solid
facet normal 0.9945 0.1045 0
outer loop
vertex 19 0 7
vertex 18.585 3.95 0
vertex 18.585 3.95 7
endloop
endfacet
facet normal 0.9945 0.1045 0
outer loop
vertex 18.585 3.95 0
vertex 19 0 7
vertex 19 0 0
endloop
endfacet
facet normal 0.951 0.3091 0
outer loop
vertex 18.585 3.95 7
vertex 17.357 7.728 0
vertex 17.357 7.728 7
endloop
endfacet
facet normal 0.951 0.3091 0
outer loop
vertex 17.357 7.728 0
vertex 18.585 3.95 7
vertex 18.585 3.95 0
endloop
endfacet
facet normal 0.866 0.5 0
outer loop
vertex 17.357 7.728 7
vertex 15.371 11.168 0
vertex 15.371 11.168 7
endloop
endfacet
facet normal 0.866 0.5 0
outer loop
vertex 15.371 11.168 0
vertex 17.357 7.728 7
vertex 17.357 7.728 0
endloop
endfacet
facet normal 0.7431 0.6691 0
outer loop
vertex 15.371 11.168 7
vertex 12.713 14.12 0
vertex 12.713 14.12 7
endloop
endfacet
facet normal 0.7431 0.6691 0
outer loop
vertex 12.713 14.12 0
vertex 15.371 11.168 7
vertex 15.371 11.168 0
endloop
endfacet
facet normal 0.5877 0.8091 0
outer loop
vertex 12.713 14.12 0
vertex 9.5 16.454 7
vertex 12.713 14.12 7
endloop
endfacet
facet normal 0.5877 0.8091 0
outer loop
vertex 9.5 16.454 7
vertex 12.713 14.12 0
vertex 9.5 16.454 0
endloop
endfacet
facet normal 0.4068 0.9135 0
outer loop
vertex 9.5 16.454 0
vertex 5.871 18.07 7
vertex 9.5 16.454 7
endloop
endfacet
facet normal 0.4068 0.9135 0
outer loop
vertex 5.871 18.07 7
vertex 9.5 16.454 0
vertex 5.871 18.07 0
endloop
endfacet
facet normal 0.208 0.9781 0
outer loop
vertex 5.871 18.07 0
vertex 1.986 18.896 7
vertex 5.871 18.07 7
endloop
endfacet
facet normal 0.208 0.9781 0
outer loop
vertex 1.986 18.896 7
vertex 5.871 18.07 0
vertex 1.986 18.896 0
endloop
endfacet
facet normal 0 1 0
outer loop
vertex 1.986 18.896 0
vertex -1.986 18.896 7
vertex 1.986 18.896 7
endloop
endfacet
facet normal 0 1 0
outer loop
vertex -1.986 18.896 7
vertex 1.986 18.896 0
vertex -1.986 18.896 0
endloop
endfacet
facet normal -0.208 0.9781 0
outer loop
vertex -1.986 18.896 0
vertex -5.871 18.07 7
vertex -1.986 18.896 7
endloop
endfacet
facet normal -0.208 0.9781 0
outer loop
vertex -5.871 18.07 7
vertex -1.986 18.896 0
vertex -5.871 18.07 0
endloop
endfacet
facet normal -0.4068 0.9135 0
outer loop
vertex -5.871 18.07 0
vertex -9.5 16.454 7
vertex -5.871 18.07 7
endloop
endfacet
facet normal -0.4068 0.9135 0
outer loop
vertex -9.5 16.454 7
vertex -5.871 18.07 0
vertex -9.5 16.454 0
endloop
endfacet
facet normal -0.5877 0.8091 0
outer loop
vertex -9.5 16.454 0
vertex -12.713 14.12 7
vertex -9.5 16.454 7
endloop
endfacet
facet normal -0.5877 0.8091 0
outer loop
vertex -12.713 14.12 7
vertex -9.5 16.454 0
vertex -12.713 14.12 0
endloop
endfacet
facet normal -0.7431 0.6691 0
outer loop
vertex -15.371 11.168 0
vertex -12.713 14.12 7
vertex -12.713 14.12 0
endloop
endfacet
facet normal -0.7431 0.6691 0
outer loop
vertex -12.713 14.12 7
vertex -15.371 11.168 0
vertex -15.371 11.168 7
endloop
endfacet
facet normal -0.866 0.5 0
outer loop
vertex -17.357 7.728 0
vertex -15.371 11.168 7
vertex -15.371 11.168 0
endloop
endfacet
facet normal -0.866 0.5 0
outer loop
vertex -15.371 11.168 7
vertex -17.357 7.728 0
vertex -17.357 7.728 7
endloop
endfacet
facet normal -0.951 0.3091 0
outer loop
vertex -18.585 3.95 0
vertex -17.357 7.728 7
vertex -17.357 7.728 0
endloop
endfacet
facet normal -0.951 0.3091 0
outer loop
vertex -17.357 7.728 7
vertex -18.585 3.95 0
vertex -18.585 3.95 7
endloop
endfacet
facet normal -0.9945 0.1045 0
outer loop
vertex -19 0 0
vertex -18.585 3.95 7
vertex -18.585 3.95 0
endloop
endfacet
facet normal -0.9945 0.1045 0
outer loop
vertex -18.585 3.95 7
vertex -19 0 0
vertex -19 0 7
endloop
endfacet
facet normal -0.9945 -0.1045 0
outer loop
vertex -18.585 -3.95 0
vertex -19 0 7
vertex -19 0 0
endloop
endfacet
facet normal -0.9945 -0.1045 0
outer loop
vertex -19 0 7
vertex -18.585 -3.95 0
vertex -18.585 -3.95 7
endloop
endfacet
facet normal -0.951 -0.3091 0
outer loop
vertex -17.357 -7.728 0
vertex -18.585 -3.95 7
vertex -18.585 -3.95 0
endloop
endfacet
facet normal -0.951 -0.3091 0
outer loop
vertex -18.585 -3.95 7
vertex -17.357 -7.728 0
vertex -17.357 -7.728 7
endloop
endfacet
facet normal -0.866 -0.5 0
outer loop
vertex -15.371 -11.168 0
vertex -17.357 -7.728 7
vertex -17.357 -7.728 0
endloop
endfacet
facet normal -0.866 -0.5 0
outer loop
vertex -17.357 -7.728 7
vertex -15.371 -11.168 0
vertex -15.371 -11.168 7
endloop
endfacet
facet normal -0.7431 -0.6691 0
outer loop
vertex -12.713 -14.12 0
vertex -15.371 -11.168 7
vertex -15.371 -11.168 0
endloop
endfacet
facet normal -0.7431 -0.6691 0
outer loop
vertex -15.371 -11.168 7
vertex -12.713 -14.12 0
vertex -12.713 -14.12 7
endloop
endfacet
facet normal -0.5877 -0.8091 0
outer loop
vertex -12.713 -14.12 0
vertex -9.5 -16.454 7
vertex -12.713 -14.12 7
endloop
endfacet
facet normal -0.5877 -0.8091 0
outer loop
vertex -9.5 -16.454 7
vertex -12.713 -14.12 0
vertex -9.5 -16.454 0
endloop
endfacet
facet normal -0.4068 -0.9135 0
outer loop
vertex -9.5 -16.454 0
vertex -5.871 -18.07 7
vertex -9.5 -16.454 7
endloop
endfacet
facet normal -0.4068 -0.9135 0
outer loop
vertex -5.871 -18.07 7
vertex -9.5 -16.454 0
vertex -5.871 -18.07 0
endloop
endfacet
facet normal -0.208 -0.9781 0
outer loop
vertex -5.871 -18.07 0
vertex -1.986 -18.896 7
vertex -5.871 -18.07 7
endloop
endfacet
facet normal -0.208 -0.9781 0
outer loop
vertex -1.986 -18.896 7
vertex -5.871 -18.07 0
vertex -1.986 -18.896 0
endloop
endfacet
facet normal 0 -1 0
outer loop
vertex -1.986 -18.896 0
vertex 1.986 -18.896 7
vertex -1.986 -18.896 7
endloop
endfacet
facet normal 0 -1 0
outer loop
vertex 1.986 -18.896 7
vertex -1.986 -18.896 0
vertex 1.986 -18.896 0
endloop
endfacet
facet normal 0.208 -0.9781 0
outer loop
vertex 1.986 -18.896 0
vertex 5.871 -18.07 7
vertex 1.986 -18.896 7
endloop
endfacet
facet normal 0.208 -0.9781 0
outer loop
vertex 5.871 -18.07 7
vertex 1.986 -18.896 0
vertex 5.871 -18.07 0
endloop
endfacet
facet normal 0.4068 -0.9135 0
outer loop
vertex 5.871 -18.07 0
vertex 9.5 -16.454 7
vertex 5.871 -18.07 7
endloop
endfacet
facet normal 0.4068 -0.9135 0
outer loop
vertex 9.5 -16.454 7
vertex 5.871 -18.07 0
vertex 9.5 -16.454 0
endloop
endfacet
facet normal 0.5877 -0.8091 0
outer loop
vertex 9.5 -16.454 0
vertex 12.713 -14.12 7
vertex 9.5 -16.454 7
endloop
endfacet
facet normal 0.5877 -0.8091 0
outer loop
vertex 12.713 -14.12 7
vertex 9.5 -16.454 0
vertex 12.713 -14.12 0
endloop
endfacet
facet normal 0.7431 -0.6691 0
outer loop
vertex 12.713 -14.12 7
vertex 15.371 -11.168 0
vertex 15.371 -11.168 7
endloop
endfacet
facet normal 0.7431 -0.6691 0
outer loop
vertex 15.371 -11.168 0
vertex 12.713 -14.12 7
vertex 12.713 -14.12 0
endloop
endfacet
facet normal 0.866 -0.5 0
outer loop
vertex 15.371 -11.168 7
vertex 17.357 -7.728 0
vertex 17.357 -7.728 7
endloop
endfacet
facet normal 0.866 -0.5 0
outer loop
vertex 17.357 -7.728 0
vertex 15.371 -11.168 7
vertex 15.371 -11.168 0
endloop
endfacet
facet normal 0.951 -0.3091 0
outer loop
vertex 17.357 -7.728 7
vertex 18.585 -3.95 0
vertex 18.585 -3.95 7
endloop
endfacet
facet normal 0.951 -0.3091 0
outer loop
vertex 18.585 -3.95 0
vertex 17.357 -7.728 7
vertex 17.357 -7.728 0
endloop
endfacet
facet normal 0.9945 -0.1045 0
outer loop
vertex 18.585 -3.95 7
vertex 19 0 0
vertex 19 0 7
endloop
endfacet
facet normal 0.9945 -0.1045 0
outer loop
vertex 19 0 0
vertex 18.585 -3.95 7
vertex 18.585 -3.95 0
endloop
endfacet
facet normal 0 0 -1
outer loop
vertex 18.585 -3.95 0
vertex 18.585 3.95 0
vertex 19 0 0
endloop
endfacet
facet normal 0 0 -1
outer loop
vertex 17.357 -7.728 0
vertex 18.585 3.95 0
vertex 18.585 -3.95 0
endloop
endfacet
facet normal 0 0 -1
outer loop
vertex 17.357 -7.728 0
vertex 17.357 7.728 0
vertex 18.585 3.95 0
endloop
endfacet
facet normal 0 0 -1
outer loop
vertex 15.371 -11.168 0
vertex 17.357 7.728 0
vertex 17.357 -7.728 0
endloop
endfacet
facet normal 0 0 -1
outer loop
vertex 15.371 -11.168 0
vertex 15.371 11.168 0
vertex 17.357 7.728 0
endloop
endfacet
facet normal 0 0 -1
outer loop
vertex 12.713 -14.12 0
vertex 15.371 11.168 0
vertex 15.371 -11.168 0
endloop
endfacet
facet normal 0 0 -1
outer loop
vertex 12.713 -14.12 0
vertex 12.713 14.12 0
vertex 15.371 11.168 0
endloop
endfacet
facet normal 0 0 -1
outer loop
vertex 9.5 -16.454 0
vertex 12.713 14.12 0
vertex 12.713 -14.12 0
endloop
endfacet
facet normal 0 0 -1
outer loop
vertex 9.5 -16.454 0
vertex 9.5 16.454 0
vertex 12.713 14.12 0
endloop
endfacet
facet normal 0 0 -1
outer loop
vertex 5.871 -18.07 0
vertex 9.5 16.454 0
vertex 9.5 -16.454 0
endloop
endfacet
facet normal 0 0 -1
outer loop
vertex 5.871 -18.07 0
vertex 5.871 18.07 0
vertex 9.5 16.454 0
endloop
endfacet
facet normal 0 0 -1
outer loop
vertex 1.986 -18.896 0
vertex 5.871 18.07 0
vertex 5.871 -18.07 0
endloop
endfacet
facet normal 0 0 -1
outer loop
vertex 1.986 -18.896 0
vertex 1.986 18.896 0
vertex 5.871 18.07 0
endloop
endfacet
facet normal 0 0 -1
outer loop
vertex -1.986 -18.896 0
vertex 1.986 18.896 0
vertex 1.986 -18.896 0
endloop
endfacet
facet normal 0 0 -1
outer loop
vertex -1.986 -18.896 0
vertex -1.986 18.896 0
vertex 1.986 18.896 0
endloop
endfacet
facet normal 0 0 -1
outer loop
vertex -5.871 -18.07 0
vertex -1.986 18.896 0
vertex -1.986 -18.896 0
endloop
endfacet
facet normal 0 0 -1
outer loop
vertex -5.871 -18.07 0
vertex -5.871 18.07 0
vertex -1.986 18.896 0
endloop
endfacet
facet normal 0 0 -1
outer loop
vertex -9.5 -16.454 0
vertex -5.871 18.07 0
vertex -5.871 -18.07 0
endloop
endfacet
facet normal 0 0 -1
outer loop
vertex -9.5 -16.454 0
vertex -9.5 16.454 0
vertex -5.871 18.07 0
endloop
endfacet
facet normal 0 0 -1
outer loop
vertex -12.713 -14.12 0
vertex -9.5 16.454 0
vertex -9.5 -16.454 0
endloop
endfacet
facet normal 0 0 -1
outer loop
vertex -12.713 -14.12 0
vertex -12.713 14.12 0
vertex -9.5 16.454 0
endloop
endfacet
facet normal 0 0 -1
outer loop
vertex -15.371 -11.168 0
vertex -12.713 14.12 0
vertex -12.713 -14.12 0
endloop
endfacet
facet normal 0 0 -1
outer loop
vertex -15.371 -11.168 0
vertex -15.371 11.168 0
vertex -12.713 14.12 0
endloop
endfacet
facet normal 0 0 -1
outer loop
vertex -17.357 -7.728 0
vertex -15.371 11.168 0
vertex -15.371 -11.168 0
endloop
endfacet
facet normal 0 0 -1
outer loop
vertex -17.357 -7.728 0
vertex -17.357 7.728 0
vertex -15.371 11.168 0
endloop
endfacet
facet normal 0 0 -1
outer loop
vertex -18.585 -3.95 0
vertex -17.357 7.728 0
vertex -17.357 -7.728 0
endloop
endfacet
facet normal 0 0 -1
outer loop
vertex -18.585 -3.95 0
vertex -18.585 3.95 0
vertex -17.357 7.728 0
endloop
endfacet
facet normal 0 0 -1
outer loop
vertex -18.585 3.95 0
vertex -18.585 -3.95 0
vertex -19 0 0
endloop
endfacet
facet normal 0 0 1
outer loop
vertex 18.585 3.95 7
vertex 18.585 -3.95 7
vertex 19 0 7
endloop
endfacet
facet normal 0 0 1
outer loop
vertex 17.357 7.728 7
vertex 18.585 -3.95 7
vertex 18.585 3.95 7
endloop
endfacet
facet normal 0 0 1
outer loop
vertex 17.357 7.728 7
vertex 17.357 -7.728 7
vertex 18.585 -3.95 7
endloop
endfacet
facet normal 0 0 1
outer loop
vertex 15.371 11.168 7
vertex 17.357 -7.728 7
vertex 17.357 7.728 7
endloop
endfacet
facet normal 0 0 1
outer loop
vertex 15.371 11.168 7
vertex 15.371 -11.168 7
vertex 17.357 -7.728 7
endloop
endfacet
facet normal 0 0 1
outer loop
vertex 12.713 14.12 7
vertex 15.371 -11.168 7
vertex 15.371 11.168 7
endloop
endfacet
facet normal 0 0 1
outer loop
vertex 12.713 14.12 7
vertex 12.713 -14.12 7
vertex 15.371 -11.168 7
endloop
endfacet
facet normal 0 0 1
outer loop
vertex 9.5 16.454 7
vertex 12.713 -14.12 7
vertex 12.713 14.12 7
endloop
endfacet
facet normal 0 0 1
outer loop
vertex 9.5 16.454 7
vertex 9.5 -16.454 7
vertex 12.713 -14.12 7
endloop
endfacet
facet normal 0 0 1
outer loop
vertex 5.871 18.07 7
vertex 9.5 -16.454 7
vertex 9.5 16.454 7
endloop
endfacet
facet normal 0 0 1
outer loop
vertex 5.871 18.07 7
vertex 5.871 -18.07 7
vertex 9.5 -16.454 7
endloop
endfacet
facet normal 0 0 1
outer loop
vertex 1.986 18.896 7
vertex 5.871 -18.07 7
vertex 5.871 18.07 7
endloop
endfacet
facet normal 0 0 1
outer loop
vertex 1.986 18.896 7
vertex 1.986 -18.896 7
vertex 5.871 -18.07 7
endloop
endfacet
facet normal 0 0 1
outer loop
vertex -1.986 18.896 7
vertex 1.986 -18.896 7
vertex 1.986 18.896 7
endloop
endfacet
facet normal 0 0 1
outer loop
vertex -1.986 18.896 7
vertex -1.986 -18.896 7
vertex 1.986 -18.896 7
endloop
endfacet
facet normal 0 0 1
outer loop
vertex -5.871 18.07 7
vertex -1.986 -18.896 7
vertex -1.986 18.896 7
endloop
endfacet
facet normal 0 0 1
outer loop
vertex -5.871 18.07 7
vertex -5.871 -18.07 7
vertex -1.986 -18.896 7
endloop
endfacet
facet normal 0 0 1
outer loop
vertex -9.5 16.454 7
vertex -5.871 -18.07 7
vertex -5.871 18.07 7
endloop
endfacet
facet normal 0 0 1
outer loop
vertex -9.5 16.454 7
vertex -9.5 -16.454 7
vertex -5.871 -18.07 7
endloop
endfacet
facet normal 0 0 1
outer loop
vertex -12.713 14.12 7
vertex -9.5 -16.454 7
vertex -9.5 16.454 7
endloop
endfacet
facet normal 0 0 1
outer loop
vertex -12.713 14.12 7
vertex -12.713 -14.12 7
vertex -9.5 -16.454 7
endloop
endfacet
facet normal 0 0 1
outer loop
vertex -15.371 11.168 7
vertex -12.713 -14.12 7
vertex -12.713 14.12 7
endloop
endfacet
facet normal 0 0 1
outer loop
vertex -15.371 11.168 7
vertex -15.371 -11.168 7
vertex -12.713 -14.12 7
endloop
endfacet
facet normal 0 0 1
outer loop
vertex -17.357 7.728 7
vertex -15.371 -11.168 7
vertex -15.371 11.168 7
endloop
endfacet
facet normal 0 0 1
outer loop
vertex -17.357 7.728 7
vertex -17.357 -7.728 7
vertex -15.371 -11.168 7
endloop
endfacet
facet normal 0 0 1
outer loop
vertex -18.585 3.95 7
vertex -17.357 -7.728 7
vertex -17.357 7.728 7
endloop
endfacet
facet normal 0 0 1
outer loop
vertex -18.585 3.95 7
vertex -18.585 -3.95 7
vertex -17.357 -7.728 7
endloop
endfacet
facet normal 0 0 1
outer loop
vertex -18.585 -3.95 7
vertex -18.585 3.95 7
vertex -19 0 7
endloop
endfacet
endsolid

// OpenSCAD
// Generated by SolidPython 1.0.1 on 2020-07-29 00:46:44


cylinder(h = 7, r1 = 19, r2 = 19);
/***********************************************
*********      SolidPython code:      **********
************************************************
 
# import packages: SolidPython
from solid import *
from solid.utils import *
from itertools import chain, combinations, permutations


class Resize:

    def __init__(self, scad_file):
        self.scad_file = scad_file
        #self.scad_file = import_scad(scad_file)
        # cone/cylinder param:
        self.r1 = 0
        self.r2 = 0
        self.h = 0
        # rectangular prism param:
        self.w = 0
        self.l = 0
        # ellipse param:
        self.r = 0

    # import OpenScad code (file name corresponds to shape)


    # classify shape + parameters
    def assign(self, param1, param2, param3):
        if self.scad_file == 'cone.scad':
            self.r1 = param1
            self.r2 = param2
            self.h = param3
        elif self.scad_file == 'cylinder.scad':
            self.r1 = param1
            self.r2 = param2
            self.h = param3
        elif self.scad_file == 'rectangularPrism.scad':
            self.h = param1
            self.l = param2
            self.w = param3
        else:
            self.r = param1
            self.h = param2

    # resize parameters
    def iterate(self):
        x = range(3, 20, 2)
        i = 1
        if self.scad_file == 'cone.scad':
            tempList = list(permutations(x, 2))
            for temp in tempList:
                param1 = temp[0]
                param2 = temp[1]
                filepath = 'produced_scad_files/' + 'cone' + str(param1) + '_' + str(param2) + '_' + '.scad'
                scad_render_to_file(cylinder(h=param1, r1=param2, r2=0), filepath)

        elif self.scad_file == 'cylinder.scad':
            tempList = list(permutations(x, 3))
            for temp in tempList:
                param1 = temp[0]
                param2 = temp[1]
                filepath = 'produced_scad_files/' + 'cylinder' + str(param1) + '_' + str(param2) + '_' + '.scad'
                scad_render_to_file(cylinder(h=param1, r1=param2, r2=param2), filepath)

        elif self.scad_file == 'rectangularPrism.scad':
            tempList = list(permutations(x, 3))
            for temp in tempList:
                param1 = temp[0]
                param2 = temp[1]
                param3 = temp[2]
                filepath = 'produced_scad_files/' + 'rectangularPrism' + str(param1) + '_' + str(param2) + '_' + str(
                    param3) + '.scad'
                scad_render_to_file(cube(size=(param1, param2, param3)), filepath)

        elif self.scad_file == 'ellipse.scad':
            tempList = list(permutations(x, 4))
            for temp in tempList:
                param1 = temp[0]
                param2 = temp[1]
                param3 = temp[2]
                param4 = temp[3]
                filepath = 'produced_scad_files/' + 'ellipse' + str(param1) + '_' + str(param2) + '_' + str(param3) + '_' + str(param4) + '.scad'
                scad_render_to_file(scale([param1, param2, param3])(sphere(r=param4)), filepath)

    def render_to_scadfile(self):
        scad_render_to_file(scad, 'example.scad') 
 
************************************************/
